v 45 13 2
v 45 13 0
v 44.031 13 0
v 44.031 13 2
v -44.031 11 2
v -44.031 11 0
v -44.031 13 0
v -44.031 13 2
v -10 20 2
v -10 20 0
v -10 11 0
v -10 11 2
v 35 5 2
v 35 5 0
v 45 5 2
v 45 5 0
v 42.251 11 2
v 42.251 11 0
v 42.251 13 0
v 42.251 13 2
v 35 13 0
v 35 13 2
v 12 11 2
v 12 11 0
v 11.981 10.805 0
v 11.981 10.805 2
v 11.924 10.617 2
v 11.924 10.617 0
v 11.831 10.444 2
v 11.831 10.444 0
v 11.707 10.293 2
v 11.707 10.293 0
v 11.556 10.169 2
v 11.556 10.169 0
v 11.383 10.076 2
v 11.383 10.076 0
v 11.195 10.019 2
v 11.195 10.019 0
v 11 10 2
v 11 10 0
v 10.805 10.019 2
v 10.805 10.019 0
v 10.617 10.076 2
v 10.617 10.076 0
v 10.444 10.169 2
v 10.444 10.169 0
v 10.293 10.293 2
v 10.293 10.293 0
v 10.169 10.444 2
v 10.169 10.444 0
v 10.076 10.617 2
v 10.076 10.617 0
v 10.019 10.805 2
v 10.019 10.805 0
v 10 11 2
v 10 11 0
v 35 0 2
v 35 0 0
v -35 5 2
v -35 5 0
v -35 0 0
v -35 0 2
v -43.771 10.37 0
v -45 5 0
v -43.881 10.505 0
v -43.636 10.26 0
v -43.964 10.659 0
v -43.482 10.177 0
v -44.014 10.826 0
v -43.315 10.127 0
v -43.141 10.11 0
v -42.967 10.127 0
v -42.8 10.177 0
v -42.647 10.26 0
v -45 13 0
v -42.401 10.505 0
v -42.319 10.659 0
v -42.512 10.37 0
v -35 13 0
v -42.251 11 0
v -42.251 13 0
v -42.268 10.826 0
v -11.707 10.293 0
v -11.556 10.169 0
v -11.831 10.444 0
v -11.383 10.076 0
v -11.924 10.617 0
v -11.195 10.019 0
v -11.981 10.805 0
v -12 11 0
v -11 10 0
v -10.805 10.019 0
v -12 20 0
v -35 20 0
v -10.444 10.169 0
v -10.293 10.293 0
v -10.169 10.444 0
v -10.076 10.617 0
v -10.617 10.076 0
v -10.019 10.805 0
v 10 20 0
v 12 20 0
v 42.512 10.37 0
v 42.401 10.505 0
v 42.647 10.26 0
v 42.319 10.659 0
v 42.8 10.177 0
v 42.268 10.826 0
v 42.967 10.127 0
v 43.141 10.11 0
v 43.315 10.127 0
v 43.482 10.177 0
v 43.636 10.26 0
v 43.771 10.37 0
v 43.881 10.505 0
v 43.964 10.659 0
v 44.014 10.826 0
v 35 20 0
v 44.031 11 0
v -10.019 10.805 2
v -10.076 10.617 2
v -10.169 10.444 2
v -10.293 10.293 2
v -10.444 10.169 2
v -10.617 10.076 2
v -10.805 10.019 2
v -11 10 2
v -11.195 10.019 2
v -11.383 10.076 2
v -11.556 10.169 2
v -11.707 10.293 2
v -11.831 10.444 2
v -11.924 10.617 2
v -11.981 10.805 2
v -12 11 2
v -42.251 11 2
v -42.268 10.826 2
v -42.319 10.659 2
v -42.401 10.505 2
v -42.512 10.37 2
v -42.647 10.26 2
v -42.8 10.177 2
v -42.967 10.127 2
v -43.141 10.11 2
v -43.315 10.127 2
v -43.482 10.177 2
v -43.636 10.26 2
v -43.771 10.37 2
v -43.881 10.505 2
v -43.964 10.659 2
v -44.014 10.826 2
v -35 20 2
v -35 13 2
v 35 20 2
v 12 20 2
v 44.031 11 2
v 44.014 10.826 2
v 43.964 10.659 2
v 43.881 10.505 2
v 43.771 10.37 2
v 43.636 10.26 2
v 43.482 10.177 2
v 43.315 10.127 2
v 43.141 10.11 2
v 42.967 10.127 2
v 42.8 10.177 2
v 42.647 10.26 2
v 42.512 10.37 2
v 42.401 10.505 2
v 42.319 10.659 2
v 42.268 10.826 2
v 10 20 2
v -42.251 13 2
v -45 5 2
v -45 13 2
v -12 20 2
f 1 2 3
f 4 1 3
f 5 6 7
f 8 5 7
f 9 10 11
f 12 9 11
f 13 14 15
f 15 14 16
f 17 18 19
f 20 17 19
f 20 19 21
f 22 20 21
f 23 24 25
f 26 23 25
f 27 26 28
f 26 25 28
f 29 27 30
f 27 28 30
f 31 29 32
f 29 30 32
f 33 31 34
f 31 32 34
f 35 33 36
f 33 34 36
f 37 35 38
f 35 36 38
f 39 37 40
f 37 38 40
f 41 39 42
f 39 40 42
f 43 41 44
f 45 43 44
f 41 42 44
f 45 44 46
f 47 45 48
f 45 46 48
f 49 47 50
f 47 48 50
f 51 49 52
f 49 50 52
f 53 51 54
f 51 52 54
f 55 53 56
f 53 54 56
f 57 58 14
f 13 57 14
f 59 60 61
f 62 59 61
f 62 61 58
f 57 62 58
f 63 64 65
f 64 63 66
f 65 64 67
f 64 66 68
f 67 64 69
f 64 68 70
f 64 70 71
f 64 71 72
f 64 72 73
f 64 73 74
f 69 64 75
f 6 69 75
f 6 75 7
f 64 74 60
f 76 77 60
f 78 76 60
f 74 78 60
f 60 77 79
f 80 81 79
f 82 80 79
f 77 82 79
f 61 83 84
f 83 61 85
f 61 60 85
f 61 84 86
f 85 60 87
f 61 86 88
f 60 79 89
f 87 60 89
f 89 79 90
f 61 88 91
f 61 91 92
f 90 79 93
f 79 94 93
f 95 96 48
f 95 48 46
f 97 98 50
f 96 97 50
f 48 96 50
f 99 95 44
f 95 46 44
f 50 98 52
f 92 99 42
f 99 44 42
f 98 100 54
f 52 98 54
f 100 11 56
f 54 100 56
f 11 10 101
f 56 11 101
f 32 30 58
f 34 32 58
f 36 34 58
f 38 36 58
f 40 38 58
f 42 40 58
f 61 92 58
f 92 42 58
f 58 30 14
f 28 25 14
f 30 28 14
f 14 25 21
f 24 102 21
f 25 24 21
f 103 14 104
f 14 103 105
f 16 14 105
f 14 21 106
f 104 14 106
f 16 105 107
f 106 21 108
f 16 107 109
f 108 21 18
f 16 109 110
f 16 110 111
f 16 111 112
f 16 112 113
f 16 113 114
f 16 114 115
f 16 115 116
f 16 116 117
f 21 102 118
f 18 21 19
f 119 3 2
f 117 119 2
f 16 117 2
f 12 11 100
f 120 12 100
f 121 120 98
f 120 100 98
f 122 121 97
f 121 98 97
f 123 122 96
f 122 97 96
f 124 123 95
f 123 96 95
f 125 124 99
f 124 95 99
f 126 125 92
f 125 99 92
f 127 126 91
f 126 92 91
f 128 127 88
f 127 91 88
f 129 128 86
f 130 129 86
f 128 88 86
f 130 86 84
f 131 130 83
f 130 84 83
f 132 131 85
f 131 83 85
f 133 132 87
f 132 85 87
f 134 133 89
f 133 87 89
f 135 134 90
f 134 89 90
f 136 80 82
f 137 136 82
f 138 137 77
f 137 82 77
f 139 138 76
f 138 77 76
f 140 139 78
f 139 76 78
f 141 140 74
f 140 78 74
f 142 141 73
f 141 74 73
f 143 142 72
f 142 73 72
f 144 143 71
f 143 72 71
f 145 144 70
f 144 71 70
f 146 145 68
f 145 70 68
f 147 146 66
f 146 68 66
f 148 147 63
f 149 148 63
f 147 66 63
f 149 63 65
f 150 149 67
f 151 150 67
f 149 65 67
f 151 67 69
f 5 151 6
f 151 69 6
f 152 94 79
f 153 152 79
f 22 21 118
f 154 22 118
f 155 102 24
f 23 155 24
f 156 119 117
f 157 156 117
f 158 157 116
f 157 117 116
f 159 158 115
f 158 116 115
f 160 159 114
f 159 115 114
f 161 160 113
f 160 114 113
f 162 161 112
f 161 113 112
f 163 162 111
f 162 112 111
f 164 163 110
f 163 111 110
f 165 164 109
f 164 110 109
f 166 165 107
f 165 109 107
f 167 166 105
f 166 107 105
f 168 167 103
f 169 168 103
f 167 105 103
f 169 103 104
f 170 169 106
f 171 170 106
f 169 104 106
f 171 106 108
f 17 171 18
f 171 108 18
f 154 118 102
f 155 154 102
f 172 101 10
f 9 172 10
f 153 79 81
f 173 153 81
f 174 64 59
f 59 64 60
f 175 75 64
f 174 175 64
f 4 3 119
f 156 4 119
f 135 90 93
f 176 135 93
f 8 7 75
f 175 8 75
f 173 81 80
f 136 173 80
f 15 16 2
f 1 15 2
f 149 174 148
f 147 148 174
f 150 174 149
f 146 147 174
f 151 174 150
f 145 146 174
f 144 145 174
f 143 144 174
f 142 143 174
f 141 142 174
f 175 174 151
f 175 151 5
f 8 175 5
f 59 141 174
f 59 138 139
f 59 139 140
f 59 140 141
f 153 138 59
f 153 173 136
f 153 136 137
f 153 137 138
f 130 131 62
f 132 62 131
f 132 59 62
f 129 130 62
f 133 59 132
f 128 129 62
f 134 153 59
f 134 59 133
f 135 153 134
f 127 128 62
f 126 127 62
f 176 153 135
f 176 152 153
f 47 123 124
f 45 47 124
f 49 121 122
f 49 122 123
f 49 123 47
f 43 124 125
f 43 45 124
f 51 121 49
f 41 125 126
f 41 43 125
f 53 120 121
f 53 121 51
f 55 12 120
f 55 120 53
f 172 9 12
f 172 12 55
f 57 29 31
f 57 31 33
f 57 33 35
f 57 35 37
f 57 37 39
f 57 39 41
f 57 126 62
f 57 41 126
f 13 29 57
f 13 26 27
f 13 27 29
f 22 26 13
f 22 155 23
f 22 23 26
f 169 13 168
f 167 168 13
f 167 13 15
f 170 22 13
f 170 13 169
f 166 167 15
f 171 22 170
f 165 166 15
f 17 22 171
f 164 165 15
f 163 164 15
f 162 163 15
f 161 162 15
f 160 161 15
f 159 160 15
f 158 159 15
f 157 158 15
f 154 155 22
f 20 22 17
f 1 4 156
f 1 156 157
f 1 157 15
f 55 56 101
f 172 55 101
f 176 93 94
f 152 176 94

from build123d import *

# Parameters (mm, degrees)
RESSALTO_EXTRUS_O1_DEPTH = 2


with BuildPart() as part:
    # Esboço1 → Ressalto-extrusão1 (new body)
    with BuildSketch(Plane.XY):
        with BuildLine():
            Line((-35, 0), (0, 0))
            Line((0, 0), (35, 0))
            Line((35, 0), (35, 5))
            Line((35, 5), (45, 5))
            Line((45, 5), (45, 13))
            Line((45, 13), (44.031459095, 13))
            Line((44.031459095, 13), (44.031459095, 11))
            ThreePointArc((44.031459095, 11), (43.141182377, 10.109723283), (42.25090566, 11))
            Line((42.25090566, 11), (42.25090566, 13))
            Line((42.25090566, 13), (35, 13))
            Line((35, 13), (35, 20))
            Line((35, 20), (12, 20))
            Line((12, 20), (12, 11))
            ThreePointArc((12, 11), (11, 10), (10, 11))
            Line((10, 11), (10, 20))
            Line((10, 20), (-10, 20))
            Line((-10, 20), (-10, 11))
            ThreePointArc((-10, 11), (-11, 10), (-12, 11))
            Line((-12, 11), (-12, 20))
            Line((-12, 20), (-35, 20))
            Line((-35, 20), (-35, 13))
            Line((-35, 13), (-42.25090566, 13))
            Line((-42.25090566, 13), (-42.25090566, 11))
            ThreePointArc((-42.25090566, 11), (-43.141182377, 10.109723283), (-44.031459095, 11))
            Line((-44.031459095, 11), (-44.031459095, 13))
            Line((-44.031459095, 13), (-45, 13))
            Line((-45, 13), (-45, 5))
            Line((-45, 5), (-35, 5))
            Line((-35, 5), (-35, 0))
        make_face()
    extrude(amount=RESSALTO_EXTRUS_O1_DEPTH)


solid = part.part
